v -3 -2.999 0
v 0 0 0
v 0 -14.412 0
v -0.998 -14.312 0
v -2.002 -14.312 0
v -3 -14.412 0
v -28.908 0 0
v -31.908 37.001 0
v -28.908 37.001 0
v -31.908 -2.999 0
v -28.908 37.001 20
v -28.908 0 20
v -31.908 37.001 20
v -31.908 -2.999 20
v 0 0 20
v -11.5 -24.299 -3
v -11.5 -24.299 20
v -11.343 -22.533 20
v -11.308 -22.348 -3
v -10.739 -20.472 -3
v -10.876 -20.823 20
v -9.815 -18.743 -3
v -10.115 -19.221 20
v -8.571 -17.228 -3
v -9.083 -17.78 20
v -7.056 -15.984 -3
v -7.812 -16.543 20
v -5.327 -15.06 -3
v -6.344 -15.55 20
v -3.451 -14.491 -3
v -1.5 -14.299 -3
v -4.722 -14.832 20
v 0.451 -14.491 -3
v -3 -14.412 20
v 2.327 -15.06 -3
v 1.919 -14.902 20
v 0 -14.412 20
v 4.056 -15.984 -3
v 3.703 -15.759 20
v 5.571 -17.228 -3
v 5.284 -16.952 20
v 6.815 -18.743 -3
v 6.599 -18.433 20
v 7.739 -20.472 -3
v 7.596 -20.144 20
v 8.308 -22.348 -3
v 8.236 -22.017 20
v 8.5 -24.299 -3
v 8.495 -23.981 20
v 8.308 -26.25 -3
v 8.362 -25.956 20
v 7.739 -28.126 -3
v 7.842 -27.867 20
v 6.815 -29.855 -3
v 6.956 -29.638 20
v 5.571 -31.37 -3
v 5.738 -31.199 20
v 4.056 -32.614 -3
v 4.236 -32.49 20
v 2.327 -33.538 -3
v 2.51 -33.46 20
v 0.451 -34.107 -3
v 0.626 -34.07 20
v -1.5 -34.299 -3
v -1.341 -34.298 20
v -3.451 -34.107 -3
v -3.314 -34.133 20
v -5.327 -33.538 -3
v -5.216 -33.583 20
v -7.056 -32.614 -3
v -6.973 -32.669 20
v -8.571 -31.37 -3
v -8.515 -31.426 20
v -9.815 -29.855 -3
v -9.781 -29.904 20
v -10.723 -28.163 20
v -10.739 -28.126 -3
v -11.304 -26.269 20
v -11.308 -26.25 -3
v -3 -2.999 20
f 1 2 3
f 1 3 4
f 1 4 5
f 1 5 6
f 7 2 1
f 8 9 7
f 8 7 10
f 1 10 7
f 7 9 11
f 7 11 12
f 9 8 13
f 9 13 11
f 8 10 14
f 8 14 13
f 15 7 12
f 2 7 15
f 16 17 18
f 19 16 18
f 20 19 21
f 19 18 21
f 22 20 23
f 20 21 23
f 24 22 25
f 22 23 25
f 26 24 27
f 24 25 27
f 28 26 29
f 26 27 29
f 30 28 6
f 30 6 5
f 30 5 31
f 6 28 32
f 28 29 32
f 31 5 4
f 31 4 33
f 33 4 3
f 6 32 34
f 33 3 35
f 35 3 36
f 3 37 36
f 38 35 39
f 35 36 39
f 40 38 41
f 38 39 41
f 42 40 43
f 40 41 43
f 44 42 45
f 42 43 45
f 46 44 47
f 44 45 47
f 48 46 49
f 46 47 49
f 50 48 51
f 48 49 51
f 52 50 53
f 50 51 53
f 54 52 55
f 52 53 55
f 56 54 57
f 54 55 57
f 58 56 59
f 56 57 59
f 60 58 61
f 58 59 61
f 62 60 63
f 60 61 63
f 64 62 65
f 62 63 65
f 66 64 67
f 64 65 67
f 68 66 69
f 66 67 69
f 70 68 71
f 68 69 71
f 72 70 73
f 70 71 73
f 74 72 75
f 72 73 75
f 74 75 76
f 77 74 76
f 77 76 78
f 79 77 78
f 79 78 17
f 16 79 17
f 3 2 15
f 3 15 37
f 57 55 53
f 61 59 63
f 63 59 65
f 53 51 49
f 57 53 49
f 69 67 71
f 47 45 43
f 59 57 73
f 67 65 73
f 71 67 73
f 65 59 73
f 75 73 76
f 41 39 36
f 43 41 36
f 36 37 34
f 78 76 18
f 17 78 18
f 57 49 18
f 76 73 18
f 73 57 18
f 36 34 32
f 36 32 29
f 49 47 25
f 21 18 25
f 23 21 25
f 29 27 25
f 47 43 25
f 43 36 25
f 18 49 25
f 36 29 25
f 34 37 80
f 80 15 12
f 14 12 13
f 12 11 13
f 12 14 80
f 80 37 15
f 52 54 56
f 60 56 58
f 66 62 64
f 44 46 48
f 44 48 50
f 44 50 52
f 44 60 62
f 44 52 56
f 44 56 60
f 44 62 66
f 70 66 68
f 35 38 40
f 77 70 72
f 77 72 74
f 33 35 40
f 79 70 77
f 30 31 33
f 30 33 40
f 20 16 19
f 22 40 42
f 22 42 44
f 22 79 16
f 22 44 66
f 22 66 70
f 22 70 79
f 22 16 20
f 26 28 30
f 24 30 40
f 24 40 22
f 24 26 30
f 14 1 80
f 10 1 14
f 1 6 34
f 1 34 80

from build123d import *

# Parameters (mm, degrees)
BOSS_EXTRUDE1_DEPTH = 20
BOSS_EXTRUDE2_START = -20
SKETCH4_R           = 10
BOSS_EXTRUDE2_DEPTH = 23


with BuildPart() as part:
    # Sketch1 → Boss-Extrude1 (new body)
    with BuildSketch(Plane.XY):
        Polygon((0, 0), (0, -27.999047944), (-3, -27.999047944), (-3, -2.999047944), (-31.907622925, -2.999047944), (-31.907622925, 37.000952056), (-28.907622925, 37.000952056), (-28.907622925, 0), align=None)
    extrude(amount=BOSS_EXTRUDE1_DEPTH)

    # Sketch4 → Boss-Extrude2 (add)
    with BuildSketch(Plane(origin=(0, 0, 0), x_dir=(-1, 0, 0), z_dir=(0, 0, -1)).offset(BOSS_EXTRUDE2_START)):
        with Locations((1.5, -24.299047944)):
            Circle(SKETCH4_R)
    extrude(amount=BOSS_EXTRUDE2_DEPTH)


solid = part.part
